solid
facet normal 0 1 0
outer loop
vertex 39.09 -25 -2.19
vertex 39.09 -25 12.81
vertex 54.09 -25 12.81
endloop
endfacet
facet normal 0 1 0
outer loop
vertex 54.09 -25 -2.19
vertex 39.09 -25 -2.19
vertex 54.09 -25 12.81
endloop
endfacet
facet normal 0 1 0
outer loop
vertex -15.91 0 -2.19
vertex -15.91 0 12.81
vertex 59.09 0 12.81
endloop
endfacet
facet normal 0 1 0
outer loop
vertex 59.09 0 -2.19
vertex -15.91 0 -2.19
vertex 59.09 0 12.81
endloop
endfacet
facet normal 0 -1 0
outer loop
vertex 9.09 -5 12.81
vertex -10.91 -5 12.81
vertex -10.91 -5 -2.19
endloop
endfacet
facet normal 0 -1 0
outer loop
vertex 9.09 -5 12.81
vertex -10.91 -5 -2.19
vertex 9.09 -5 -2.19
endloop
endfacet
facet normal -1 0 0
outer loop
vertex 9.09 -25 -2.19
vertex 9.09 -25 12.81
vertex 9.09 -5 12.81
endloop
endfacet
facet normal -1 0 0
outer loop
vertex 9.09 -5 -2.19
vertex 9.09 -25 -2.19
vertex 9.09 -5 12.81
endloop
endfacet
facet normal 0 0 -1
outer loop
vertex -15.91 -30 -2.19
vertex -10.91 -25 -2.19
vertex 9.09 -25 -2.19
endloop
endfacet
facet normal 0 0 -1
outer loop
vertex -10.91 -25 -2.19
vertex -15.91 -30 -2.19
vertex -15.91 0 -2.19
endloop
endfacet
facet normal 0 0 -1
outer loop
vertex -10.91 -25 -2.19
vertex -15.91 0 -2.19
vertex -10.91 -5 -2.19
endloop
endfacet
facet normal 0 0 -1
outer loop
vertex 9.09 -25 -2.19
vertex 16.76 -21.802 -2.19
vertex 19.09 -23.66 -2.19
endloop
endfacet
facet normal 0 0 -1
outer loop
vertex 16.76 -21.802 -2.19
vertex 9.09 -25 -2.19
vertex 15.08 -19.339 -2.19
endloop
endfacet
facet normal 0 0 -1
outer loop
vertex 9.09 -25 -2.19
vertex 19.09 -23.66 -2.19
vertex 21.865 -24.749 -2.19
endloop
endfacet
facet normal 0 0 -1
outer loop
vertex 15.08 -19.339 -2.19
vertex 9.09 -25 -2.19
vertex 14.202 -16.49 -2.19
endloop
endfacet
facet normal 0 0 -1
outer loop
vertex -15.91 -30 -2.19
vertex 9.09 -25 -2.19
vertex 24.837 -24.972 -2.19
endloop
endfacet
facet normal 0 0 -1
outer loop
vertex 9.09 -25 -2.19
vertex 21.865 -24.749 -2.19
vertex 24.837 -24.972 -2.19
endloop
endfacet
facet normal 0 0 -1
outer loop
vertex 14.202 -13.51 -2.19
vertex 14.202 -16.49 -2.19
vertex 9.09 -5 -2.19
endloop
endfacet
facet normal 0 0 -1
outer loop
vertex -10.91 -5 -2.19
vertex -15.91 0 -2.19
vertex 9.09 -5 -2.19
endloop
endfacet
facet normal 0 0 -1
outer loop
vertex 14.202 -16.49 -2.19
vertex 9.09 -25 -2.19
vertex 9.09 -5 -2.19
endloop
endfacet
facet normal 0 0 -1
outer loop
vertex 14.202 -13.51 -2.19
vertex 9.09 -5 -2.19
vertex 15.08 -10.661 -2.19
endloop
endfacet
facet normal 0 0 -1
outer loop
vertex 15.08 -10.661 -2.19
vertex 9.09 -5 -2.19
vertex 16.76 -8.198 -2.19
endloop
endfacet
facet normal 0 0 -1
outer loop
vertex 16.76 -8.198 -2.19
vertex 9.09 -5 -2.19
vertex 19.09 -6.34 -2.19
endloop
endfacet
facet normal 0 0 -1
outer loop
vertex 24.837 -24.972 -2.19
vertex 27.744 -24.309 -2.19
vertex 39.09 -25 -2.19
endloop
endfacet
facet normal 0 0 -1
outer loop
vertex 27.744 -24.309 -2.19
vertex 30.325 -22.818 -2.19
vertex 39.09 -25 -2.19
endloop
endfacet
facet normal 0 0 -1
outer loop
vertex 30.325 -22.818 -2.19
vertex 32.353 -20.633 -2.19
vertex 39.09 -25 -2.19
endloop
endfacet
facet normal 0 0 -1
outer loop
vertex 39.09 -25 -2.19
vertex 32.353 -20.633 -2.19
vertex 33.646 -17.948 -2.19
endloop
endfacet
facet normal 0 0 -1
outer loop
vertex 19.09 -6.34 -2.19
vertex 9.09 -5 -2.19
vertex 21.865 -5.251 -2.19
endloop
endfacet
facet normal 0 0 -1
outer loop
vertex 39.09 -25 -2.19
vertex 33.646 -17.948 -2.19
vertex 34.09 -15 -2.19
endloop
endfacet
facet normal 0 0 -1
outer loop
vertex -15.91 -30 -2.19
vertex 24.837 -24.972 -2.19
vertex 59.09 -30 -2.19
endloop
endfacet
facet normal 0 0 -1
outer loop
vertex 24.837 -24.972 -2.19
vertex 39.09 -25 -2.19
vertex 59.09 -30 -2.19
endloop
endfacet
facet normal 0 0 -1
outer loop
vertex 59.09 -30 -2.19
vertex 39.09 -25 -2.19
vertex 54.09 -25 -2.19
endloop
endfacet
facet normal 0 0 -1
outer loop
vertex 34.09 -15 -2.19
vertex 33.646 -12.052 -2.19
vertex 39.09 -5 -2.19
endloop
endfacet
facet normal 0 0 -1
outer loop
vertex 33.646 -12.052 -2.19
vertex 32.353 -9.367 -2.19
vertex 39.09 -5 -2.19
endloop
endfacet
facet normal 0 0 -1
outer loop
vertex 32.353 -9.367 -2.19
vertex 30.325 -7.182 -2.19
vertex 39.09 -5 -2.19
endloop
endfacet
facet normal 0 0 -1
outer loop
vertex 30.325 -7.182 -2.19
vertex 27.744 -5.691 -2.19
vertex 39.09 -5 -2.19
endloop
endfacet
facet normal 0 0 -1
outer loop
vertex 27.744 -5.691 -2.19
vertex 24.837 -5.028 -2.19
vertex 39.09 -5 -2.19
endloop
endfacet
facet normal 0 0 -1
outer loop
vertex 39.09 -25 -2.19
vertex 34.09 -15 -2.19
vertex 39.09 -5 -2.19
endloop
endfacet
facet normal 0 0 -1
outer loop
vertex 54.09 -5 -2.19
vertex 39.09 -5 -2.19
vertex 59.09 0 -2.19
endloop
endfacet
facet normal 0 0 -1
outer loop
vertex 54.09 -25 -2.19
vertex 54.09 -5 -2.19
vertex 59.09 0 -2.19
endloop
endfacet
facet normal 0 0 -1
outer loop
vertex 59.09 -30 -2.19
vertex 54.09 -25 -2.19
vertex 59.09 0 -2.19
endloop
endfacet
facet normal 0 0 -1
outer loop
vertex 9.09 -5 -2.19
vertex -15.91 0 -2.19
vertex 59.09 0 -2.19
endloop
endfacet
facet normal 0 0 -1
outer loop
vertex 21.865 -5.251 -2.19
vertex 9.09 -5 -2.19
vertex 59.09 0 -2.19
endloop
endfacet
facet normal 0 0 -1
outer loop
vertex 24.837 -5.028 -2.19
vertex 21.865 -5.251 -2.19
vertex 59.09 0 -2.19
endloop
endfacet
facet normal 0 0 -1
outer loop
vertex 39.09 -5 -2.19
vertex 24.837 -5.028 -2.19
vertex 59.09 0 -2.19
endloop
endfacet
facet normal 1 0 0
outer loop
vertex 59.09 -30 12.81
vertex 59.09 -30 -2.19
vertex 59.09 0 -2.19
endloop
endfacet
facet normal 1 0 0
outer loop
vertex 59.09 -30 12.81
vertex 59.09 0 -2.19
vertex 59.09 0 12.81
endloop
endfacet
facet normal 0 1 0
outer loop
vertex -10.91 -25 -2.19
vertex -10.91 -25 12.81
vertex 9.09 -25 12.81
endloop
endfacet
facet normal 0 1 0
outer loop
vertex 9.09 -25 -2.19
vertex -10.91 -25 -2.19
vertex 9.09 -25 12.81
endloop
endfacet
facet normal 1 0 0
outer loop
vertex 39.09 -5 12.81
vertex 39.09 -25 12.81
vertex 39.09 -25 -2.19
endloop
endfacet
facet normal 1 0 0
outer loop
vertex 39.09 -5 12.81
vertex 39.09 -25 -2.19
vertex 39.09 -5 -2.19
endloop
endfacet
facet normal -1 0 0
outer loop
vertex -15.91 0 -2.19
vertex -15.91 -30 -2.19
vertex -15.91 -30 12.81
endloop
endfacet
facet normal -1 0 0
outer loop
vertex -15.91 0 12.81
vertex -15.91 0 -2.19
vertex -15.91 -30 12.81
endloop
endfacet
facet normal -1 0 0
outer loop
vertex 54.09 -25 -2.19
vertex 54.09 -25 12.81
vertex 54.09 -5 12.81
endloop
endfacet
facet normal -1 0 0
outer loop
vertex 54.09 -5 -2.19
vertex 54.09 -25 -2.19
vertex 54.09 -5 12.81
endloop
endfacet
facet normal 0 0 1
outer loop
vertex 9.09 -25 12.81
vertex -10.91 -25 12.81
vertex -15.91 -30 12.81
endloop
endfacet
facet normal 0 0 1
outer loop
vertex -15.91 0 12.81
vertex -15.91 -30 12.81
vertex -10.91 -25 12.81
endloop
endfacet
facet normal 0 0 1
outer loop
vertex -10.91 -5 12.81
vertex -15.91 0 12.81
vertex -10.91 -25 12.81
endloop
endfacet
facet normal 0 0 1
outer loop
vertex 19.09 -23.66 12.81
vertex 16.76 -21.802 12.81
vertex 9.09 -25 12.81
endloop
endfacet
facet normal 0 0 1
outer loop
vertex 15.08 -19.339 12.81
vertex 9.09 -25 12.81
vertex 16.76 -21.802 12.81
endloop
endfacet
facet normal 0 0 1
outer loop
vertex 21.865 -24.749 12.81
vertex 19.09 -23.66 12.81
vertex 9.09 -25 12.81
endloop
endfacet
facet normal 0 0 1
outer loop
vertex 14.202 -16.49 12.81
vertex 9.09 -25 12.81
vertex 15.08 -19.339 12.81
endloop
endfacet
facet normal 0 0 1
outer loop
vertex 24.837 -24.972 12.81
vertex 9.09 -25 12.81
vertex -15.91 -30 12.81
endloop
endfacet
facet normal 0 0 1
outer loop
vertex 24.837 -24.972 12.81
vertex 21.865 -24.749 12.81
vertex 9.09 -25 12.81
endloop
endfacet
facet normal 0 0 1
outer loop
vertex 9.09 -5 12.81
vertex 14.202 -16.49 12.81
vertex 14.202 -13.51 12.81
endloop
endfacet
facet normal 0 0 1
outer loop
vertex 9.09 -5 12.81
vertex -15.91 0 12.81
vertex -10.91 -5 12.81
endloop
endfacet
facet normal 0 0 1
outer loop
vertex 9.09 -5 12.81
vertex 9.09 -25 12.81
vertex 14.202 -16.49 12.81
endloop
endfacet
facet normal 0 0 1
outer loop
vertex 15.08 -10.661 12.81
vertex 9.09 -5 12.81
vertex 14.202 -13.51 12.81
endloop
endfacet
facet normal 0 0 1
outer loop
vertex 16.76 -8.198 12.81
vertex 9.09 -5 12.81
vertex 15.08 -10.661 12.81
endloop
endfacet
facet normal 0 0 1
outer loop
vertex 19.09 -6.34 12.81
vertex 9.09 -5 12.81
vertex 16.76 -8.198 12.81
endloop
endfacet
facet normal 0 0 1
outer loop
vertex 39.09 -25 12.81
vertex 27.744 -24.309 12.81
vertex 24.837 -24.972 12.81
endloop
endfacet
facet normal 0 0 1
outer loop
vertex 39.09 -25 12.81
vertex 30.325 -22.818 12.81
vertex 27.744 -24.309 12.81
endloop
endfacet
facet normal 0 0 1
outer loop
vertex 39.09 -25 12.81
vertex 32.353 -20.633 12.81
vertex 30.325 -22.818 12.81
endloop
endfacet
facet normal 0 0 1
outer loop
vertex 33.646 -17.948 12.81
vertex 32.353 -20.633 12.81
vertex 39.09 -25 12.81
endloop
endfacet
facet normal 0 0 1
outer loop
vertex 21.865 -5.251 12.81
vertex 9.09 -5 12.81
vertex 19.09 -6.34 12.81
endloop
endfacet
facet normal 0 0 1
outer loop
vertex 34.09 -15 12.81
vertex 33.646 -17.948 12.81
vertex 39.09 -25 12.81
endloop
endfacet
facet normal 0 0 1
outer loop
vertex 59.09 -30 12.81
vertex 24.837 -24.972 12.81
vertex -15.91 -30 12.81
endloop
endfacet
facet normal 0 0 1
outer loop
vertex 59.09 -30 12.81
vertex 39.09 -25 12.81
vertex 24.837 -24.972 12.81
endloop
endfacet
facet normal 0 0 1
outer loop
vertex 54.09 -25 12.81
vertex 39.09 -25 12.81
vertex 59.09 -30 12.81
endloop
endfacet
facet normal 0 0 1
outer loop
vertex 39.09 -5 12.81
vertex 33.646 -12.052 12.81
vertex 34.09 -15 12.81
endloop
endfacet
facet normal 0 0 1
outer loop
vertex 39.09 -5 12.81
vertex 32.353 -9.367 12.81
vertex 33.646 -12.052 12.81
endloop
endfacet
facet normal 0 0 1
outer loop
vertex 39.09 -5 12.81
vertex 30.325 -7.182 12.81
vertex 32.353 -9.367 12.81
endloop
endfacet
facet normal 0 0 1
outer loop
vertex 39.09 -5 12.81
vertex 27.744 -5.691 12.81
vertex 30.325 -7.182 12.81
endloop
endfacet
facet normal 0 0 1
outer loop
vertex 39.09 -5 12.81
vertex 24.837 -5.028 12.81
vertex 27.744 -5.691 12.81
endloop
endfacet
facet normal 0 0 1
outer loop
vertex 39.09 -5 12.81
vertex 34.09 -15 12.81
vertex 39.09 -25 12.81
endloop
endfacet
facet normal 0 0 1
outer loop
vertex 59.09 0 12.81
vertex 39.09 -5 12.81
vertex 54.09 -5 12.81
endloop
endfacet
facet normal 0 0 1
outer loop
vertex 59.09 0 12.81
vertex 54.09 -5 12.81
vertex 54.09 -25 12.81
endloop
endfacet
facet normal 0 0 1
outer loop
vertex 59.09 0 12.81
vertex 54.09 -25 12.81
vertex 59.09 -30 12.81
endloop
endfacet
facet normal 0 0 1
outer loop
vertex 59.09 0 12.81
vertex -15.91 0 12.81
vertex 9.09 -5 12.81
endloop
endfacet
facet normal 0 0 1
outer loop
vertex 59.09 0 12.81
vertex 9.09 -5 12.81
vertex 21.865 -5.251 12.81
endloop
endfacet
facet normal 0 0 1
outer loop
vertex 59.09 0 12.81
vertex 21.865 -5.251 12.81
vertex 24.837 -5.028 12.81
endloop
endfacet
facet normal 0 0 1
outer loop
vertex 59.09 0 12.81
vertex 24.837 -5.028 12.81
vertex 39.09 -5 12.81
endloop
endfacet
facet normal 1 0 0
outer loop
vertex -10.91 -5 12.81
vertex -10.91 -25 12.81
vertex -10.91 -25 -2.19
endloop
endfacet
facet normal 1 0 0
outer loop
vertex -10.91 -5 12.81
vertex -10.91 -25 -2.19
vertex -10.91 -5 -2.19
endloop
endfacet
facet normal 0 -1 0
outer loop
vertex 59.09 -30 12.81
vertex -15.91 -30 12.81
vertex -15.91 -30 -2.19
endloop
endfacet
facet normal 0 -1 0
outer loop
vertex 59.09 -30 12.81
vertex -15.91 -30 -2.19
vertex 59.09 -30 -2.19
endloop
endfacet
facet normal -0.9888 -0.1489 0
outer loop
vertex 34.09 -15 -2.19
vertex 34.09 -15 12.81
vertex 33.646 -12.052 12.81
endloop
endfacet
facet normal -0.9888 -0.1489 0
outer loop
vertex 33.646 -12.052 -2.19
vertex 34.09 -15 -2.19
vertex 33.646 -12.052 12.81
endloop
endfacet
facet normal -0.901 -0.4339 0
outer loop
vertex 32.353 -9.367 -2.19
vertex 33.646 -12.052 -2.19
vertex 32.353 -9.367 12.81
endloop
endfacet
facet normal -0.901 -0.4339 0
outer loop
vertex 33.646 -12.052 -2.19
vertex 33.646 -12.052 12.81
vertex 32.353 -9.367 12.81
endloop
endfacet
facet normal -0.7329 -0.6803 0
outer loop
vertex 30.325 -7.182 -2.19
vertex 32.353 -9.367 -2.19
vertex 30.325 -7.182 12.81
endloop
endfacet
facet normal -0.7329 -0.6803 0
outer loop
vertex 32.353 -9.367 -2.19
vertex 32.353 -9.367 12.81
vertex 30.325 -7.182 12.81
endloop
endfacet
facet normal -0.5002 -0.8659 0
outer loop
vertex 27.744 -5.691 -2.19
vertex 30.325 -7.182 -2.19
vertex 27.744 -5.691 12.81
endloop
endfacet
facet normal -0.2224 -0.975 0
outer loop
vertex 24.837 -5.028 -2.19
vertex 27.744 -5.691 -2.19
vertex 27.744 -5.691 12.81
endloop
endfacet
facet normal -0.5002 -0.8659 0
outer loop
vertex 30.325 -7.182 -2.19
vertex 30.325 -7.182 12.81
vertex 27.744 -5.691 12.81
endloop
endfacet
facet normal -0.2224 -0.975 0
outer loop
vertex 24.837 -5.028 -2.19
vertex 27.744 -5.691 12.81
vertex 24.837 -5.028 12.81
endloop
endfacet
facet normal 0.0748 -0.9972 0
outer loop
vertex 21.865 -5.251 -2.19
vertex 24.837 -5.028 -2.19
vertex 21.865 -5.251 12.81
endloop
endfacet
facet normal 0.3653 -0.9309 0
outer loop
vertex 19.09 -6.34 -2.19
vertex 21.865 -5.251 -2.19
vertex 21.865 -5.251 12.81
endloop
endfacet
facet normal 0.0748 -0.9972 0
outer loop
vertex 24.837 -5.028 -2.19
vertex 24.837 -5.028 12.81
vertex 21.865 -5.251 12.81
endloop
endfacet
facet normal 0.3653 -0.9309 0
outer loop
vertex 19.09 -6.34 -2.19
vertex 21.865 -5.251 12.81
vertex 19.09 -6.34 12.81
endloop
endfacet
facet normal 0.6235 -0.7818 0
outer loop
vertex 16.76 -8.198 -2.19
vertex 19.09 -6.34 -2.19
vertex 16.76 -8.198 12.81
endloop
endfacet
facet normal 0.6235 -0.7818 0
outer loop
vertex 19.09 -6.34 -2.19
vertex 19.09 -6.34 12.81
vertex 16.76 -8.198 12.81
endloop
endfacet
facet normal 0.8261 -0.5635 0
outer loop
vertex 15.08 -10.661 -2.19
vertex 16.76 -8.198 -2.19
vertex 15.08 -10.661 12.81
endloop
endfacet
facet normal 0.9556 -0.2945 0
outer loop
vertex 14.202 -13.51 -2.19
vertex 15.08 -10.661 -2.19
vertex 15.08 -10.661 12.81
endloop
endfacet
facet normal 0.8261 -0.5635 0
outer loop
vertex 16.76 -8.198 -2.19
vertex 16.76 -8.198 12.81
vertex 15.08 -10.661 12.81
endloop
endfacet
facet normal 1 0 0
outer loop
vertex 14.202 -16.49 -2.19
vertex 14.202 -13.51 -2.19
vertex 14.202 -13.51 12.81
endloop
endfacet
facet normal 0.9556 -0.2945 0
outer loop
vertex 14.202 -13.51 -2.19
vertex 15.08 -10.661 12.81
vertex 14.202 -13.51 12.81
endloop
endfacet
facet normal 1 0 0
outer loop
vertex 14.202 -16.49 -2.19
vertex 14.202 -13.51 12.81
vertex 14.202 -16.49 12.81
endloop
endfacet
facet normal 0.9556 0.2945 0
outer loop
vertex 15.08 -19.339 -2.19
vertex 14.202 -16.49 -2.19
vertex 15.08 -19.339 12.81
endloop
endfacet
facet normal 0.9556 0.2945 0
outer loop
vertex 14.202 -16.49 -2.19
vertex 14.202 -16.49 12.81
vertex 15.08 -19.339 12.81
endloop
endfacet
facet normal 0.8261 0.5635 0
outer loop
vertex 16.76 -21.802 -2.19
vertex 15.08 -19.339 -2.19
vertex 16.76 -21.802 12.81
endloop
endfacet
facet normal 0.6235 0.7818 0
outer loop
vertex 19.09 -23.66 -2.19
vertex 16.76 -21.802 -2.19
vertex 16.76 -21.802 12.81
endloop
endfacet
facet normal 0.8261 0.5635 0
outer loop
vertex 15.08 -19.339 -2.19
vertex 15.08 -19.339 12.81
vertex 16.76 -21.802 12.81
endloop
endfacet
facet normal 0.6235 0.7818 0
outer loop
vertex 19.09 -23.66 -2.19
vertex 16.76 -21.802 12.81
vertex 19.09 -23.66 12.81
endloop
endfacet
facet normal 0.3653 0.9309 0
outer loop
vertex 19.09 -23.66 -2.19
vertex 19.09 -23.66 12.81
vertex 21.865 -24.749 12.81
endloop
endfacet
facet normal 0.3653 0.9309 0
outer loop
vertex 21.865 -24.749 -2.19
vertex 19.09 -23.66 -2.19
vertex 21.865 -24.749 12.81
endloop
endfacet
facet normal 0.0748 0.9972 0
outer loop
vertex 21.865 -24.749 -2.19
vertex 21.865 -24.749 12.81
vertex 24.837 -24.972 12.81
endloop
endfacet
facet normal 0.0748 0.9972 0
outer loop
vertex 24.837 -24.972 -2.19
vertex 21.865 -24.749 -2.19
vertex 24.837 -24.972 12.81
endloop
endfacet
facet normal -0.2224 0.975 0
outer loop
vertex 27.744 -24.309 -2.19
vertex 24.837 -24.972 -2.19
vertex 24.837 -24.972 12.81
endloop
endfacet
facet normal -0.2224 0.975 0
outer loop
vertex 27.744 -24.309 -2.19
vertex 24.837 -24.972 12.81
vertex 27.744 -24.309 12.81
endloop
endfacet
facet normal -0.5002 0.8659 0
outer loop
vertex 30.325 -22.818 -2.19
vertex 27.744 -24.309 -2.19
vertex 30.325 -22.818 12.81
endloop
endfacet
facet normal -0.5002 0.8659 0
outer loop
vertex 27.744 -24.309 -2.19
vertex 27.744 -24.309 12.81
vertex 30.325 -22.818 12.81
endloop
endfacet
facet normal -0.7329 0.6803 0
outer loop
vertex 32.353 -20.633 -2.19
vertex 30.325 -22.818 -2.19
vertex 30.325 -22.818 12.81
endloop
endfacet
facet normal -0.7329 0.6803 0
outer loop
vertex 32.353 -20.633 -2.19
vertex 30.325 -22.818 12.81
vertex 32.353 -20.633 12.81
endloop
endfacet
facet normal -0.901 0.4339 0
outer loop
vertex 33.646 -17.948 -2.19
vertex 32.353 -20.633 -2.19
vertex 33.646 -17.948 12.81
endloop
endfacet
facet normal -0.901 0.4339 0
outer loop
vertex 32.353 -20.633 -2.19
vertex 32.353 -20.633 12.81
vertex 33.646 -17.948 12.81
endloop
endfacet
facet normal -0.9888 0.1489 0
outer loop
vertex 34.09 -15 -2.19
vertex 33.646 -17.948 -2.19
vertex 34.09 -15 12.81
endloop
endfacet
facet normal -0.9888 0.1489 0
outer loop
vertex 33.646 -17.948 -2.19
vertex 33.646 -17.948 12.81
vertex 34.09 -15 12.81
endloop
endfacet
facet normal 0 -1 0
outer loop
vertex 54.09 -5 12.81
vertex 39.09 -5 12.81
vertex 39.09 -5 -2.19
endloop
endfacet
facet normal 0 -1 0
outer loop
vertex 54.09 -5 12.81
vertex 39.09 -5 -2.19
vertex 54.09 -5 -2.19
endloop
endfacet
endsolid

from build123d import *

# Parameters (mm, degrees)
F0_W     = 75
F0_H     = 15
F1_DEPTH = 30
F2_W     = 20
F2_H     = 20
F3_DEPTH = 15
F4_R     = 10
F5_DEPTH = 15
F6_W     = 15
F6_H     = 20
F7_DEPTH = 15


with BuildPart() as f1:
    # F0 (on Front) → F1 (new body)
    with BuildSketch(Plane.XZ):
        with Locations((21.590133, 5.310398)):
            Rectangle(F0_W, F0_H)
    extrude(amount=F1_DEPTH)

    # F2 (on face) → F3 (cut)
    with BuildSketch(Plane.XY.offset(12.810398)):
        with Locations((-0.909867, -15)):
            Rectangle(F2_W, F2_H)
    extrude(amount=-F3_DEPTH, mode=Mode.SUBTRACT)

    # F4 (on face) → F5 (cut)
    with BuildSketch(Plane.XY.offset(12.810398)):
        with Locations((24.090133, -15)):
            Circle(F4_R)
    extrude(amount=-F5_DEPTH, mode=Mode.SUBTRACT)

    # F6 (on face) → F7 (cut)
    with BuildSketch(Plane.XY.offset(12.810398)):
        with Locations((46.590133, -15)):
            Rectangle(F6_W, F6_H)
    extrude(amount=-F7_DEPTH, mode=Mode.SUBTRACT)


solid = f1.part
